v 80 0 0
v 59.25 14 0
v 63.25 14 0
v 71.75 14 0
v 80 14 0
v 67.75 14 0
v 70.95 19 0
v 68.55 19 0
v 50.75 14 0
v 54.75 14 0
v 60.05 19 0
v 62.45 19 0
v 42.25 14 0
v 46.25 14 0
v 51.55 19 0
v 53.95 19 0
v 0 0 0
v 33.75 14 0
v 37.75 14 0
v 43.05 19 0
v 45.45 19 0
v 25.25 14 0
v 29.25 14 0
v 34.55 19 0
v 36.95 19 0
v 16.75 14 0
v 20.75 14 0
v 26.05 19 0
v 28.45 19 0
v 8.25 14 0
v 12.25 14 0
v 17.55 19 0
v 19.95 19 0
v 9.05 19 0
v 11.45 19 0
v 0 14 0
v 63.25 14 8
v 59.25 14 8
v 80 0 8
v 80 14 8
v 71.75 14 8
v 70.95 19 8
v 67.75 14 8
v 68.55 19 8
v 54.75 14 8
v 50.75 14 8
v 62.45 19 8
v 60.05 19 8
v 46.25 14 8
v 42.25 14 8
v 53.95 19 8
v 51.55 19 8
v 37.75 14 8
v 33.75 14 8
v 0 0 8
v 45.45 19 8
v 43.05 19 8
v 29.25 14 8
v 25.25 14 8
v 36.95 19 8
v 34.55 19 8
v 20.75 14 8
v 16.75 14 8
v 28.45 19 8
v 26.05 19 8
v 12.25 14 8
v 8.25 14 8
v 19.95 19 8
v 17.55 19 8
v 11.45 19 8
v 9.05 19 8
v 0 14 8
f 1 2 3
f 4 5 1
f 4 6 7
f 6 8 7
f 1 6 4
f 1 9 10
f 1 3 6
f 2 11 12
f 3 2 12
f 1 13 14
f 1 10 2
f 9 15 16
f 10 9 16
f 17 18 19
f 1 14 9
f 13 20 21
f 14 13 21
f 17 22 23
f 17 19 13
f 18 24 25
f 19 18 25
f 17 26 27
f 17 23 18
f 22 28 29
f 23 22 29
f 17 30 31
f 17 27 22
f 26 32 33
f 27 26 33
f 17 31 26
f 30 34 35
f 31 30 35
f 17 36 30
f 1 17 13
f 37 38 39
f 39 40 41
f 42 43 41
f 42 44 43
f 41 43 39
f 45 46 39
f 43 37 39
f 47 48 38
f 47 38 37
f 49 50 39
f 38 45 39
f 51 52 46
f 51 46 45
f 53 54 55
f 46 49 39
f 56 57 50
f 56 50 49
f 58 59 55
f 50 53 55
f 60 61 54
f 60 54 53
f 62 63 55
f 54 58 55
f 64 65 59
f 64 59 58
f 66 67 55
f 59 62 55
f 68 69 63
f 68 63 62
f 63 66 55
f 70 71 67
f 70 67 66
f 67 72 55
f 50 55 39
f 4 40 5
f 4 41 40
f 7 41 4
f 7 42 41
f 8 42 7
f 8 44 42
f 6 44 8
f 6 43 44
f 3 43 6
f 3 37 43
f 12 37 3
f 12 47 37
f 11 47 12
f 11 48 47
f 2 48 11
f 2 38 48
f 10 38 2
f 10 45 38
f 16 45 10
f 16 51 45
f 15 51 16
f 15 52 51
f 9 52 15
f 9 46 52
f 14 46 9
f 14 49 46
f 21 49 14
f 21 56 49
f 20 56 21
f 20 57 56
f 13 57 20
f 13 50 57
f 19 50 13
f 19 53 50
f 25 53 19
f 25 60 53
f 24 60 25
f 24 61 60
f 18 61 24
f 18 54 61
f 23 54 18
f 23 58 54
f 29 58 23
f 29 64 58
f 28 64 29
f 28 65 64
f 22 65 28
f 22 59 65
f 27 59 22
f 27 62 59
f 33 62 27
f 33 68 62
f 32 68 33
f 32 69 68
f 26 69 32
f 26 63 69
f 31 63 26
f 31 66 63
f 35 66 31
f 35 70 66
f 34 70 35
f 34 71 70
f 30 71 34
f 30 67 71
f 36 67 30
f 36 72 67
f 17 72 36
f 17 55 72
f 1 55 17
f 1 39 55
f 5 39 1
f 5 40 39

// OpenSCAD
$fn = 32;

// ----------------------------------------------------------------------
// Gear rack: 8 teeth on a 80 mm bar, pitch 8.5 mm
// ----------------------------------------------------------------------

// --- parameters (mm) ---
profile_height = 8;       // extrusion height
profile_points = 36;      // points of the closed outline

profile = [[0, 0], [80, 0], [80, 14], [71.75, 14], [70.95, 19], [68.55, 19], [67.75, 14], [63.25, 14], [62.45, 19], [60.05, 19], [59.25, 14], [54.75, 14], [53.95, 19], [51.55, 19], [50.75, 14], [46.25, 14], [45.45, 19], [43.05, 19], [42.25, 14], [37.75, 14], [36.95, 19], [34.55, 19], [33.75, 14], [29.25, 14], [28.45, 19], [26.05, 19], [25.25, 14], [20.75, 14], [19.95, 19], [17.55, 19], [16.75, 14], [12.25, 14], [11.45, 19], [9.05, 19], [8.25, 14], [0, 14]];  // single closed polygon, 36 points, counter clockwise

// --- the one profile operation ---
linear_extrude(height = profile_height) polygon(points = profile);
